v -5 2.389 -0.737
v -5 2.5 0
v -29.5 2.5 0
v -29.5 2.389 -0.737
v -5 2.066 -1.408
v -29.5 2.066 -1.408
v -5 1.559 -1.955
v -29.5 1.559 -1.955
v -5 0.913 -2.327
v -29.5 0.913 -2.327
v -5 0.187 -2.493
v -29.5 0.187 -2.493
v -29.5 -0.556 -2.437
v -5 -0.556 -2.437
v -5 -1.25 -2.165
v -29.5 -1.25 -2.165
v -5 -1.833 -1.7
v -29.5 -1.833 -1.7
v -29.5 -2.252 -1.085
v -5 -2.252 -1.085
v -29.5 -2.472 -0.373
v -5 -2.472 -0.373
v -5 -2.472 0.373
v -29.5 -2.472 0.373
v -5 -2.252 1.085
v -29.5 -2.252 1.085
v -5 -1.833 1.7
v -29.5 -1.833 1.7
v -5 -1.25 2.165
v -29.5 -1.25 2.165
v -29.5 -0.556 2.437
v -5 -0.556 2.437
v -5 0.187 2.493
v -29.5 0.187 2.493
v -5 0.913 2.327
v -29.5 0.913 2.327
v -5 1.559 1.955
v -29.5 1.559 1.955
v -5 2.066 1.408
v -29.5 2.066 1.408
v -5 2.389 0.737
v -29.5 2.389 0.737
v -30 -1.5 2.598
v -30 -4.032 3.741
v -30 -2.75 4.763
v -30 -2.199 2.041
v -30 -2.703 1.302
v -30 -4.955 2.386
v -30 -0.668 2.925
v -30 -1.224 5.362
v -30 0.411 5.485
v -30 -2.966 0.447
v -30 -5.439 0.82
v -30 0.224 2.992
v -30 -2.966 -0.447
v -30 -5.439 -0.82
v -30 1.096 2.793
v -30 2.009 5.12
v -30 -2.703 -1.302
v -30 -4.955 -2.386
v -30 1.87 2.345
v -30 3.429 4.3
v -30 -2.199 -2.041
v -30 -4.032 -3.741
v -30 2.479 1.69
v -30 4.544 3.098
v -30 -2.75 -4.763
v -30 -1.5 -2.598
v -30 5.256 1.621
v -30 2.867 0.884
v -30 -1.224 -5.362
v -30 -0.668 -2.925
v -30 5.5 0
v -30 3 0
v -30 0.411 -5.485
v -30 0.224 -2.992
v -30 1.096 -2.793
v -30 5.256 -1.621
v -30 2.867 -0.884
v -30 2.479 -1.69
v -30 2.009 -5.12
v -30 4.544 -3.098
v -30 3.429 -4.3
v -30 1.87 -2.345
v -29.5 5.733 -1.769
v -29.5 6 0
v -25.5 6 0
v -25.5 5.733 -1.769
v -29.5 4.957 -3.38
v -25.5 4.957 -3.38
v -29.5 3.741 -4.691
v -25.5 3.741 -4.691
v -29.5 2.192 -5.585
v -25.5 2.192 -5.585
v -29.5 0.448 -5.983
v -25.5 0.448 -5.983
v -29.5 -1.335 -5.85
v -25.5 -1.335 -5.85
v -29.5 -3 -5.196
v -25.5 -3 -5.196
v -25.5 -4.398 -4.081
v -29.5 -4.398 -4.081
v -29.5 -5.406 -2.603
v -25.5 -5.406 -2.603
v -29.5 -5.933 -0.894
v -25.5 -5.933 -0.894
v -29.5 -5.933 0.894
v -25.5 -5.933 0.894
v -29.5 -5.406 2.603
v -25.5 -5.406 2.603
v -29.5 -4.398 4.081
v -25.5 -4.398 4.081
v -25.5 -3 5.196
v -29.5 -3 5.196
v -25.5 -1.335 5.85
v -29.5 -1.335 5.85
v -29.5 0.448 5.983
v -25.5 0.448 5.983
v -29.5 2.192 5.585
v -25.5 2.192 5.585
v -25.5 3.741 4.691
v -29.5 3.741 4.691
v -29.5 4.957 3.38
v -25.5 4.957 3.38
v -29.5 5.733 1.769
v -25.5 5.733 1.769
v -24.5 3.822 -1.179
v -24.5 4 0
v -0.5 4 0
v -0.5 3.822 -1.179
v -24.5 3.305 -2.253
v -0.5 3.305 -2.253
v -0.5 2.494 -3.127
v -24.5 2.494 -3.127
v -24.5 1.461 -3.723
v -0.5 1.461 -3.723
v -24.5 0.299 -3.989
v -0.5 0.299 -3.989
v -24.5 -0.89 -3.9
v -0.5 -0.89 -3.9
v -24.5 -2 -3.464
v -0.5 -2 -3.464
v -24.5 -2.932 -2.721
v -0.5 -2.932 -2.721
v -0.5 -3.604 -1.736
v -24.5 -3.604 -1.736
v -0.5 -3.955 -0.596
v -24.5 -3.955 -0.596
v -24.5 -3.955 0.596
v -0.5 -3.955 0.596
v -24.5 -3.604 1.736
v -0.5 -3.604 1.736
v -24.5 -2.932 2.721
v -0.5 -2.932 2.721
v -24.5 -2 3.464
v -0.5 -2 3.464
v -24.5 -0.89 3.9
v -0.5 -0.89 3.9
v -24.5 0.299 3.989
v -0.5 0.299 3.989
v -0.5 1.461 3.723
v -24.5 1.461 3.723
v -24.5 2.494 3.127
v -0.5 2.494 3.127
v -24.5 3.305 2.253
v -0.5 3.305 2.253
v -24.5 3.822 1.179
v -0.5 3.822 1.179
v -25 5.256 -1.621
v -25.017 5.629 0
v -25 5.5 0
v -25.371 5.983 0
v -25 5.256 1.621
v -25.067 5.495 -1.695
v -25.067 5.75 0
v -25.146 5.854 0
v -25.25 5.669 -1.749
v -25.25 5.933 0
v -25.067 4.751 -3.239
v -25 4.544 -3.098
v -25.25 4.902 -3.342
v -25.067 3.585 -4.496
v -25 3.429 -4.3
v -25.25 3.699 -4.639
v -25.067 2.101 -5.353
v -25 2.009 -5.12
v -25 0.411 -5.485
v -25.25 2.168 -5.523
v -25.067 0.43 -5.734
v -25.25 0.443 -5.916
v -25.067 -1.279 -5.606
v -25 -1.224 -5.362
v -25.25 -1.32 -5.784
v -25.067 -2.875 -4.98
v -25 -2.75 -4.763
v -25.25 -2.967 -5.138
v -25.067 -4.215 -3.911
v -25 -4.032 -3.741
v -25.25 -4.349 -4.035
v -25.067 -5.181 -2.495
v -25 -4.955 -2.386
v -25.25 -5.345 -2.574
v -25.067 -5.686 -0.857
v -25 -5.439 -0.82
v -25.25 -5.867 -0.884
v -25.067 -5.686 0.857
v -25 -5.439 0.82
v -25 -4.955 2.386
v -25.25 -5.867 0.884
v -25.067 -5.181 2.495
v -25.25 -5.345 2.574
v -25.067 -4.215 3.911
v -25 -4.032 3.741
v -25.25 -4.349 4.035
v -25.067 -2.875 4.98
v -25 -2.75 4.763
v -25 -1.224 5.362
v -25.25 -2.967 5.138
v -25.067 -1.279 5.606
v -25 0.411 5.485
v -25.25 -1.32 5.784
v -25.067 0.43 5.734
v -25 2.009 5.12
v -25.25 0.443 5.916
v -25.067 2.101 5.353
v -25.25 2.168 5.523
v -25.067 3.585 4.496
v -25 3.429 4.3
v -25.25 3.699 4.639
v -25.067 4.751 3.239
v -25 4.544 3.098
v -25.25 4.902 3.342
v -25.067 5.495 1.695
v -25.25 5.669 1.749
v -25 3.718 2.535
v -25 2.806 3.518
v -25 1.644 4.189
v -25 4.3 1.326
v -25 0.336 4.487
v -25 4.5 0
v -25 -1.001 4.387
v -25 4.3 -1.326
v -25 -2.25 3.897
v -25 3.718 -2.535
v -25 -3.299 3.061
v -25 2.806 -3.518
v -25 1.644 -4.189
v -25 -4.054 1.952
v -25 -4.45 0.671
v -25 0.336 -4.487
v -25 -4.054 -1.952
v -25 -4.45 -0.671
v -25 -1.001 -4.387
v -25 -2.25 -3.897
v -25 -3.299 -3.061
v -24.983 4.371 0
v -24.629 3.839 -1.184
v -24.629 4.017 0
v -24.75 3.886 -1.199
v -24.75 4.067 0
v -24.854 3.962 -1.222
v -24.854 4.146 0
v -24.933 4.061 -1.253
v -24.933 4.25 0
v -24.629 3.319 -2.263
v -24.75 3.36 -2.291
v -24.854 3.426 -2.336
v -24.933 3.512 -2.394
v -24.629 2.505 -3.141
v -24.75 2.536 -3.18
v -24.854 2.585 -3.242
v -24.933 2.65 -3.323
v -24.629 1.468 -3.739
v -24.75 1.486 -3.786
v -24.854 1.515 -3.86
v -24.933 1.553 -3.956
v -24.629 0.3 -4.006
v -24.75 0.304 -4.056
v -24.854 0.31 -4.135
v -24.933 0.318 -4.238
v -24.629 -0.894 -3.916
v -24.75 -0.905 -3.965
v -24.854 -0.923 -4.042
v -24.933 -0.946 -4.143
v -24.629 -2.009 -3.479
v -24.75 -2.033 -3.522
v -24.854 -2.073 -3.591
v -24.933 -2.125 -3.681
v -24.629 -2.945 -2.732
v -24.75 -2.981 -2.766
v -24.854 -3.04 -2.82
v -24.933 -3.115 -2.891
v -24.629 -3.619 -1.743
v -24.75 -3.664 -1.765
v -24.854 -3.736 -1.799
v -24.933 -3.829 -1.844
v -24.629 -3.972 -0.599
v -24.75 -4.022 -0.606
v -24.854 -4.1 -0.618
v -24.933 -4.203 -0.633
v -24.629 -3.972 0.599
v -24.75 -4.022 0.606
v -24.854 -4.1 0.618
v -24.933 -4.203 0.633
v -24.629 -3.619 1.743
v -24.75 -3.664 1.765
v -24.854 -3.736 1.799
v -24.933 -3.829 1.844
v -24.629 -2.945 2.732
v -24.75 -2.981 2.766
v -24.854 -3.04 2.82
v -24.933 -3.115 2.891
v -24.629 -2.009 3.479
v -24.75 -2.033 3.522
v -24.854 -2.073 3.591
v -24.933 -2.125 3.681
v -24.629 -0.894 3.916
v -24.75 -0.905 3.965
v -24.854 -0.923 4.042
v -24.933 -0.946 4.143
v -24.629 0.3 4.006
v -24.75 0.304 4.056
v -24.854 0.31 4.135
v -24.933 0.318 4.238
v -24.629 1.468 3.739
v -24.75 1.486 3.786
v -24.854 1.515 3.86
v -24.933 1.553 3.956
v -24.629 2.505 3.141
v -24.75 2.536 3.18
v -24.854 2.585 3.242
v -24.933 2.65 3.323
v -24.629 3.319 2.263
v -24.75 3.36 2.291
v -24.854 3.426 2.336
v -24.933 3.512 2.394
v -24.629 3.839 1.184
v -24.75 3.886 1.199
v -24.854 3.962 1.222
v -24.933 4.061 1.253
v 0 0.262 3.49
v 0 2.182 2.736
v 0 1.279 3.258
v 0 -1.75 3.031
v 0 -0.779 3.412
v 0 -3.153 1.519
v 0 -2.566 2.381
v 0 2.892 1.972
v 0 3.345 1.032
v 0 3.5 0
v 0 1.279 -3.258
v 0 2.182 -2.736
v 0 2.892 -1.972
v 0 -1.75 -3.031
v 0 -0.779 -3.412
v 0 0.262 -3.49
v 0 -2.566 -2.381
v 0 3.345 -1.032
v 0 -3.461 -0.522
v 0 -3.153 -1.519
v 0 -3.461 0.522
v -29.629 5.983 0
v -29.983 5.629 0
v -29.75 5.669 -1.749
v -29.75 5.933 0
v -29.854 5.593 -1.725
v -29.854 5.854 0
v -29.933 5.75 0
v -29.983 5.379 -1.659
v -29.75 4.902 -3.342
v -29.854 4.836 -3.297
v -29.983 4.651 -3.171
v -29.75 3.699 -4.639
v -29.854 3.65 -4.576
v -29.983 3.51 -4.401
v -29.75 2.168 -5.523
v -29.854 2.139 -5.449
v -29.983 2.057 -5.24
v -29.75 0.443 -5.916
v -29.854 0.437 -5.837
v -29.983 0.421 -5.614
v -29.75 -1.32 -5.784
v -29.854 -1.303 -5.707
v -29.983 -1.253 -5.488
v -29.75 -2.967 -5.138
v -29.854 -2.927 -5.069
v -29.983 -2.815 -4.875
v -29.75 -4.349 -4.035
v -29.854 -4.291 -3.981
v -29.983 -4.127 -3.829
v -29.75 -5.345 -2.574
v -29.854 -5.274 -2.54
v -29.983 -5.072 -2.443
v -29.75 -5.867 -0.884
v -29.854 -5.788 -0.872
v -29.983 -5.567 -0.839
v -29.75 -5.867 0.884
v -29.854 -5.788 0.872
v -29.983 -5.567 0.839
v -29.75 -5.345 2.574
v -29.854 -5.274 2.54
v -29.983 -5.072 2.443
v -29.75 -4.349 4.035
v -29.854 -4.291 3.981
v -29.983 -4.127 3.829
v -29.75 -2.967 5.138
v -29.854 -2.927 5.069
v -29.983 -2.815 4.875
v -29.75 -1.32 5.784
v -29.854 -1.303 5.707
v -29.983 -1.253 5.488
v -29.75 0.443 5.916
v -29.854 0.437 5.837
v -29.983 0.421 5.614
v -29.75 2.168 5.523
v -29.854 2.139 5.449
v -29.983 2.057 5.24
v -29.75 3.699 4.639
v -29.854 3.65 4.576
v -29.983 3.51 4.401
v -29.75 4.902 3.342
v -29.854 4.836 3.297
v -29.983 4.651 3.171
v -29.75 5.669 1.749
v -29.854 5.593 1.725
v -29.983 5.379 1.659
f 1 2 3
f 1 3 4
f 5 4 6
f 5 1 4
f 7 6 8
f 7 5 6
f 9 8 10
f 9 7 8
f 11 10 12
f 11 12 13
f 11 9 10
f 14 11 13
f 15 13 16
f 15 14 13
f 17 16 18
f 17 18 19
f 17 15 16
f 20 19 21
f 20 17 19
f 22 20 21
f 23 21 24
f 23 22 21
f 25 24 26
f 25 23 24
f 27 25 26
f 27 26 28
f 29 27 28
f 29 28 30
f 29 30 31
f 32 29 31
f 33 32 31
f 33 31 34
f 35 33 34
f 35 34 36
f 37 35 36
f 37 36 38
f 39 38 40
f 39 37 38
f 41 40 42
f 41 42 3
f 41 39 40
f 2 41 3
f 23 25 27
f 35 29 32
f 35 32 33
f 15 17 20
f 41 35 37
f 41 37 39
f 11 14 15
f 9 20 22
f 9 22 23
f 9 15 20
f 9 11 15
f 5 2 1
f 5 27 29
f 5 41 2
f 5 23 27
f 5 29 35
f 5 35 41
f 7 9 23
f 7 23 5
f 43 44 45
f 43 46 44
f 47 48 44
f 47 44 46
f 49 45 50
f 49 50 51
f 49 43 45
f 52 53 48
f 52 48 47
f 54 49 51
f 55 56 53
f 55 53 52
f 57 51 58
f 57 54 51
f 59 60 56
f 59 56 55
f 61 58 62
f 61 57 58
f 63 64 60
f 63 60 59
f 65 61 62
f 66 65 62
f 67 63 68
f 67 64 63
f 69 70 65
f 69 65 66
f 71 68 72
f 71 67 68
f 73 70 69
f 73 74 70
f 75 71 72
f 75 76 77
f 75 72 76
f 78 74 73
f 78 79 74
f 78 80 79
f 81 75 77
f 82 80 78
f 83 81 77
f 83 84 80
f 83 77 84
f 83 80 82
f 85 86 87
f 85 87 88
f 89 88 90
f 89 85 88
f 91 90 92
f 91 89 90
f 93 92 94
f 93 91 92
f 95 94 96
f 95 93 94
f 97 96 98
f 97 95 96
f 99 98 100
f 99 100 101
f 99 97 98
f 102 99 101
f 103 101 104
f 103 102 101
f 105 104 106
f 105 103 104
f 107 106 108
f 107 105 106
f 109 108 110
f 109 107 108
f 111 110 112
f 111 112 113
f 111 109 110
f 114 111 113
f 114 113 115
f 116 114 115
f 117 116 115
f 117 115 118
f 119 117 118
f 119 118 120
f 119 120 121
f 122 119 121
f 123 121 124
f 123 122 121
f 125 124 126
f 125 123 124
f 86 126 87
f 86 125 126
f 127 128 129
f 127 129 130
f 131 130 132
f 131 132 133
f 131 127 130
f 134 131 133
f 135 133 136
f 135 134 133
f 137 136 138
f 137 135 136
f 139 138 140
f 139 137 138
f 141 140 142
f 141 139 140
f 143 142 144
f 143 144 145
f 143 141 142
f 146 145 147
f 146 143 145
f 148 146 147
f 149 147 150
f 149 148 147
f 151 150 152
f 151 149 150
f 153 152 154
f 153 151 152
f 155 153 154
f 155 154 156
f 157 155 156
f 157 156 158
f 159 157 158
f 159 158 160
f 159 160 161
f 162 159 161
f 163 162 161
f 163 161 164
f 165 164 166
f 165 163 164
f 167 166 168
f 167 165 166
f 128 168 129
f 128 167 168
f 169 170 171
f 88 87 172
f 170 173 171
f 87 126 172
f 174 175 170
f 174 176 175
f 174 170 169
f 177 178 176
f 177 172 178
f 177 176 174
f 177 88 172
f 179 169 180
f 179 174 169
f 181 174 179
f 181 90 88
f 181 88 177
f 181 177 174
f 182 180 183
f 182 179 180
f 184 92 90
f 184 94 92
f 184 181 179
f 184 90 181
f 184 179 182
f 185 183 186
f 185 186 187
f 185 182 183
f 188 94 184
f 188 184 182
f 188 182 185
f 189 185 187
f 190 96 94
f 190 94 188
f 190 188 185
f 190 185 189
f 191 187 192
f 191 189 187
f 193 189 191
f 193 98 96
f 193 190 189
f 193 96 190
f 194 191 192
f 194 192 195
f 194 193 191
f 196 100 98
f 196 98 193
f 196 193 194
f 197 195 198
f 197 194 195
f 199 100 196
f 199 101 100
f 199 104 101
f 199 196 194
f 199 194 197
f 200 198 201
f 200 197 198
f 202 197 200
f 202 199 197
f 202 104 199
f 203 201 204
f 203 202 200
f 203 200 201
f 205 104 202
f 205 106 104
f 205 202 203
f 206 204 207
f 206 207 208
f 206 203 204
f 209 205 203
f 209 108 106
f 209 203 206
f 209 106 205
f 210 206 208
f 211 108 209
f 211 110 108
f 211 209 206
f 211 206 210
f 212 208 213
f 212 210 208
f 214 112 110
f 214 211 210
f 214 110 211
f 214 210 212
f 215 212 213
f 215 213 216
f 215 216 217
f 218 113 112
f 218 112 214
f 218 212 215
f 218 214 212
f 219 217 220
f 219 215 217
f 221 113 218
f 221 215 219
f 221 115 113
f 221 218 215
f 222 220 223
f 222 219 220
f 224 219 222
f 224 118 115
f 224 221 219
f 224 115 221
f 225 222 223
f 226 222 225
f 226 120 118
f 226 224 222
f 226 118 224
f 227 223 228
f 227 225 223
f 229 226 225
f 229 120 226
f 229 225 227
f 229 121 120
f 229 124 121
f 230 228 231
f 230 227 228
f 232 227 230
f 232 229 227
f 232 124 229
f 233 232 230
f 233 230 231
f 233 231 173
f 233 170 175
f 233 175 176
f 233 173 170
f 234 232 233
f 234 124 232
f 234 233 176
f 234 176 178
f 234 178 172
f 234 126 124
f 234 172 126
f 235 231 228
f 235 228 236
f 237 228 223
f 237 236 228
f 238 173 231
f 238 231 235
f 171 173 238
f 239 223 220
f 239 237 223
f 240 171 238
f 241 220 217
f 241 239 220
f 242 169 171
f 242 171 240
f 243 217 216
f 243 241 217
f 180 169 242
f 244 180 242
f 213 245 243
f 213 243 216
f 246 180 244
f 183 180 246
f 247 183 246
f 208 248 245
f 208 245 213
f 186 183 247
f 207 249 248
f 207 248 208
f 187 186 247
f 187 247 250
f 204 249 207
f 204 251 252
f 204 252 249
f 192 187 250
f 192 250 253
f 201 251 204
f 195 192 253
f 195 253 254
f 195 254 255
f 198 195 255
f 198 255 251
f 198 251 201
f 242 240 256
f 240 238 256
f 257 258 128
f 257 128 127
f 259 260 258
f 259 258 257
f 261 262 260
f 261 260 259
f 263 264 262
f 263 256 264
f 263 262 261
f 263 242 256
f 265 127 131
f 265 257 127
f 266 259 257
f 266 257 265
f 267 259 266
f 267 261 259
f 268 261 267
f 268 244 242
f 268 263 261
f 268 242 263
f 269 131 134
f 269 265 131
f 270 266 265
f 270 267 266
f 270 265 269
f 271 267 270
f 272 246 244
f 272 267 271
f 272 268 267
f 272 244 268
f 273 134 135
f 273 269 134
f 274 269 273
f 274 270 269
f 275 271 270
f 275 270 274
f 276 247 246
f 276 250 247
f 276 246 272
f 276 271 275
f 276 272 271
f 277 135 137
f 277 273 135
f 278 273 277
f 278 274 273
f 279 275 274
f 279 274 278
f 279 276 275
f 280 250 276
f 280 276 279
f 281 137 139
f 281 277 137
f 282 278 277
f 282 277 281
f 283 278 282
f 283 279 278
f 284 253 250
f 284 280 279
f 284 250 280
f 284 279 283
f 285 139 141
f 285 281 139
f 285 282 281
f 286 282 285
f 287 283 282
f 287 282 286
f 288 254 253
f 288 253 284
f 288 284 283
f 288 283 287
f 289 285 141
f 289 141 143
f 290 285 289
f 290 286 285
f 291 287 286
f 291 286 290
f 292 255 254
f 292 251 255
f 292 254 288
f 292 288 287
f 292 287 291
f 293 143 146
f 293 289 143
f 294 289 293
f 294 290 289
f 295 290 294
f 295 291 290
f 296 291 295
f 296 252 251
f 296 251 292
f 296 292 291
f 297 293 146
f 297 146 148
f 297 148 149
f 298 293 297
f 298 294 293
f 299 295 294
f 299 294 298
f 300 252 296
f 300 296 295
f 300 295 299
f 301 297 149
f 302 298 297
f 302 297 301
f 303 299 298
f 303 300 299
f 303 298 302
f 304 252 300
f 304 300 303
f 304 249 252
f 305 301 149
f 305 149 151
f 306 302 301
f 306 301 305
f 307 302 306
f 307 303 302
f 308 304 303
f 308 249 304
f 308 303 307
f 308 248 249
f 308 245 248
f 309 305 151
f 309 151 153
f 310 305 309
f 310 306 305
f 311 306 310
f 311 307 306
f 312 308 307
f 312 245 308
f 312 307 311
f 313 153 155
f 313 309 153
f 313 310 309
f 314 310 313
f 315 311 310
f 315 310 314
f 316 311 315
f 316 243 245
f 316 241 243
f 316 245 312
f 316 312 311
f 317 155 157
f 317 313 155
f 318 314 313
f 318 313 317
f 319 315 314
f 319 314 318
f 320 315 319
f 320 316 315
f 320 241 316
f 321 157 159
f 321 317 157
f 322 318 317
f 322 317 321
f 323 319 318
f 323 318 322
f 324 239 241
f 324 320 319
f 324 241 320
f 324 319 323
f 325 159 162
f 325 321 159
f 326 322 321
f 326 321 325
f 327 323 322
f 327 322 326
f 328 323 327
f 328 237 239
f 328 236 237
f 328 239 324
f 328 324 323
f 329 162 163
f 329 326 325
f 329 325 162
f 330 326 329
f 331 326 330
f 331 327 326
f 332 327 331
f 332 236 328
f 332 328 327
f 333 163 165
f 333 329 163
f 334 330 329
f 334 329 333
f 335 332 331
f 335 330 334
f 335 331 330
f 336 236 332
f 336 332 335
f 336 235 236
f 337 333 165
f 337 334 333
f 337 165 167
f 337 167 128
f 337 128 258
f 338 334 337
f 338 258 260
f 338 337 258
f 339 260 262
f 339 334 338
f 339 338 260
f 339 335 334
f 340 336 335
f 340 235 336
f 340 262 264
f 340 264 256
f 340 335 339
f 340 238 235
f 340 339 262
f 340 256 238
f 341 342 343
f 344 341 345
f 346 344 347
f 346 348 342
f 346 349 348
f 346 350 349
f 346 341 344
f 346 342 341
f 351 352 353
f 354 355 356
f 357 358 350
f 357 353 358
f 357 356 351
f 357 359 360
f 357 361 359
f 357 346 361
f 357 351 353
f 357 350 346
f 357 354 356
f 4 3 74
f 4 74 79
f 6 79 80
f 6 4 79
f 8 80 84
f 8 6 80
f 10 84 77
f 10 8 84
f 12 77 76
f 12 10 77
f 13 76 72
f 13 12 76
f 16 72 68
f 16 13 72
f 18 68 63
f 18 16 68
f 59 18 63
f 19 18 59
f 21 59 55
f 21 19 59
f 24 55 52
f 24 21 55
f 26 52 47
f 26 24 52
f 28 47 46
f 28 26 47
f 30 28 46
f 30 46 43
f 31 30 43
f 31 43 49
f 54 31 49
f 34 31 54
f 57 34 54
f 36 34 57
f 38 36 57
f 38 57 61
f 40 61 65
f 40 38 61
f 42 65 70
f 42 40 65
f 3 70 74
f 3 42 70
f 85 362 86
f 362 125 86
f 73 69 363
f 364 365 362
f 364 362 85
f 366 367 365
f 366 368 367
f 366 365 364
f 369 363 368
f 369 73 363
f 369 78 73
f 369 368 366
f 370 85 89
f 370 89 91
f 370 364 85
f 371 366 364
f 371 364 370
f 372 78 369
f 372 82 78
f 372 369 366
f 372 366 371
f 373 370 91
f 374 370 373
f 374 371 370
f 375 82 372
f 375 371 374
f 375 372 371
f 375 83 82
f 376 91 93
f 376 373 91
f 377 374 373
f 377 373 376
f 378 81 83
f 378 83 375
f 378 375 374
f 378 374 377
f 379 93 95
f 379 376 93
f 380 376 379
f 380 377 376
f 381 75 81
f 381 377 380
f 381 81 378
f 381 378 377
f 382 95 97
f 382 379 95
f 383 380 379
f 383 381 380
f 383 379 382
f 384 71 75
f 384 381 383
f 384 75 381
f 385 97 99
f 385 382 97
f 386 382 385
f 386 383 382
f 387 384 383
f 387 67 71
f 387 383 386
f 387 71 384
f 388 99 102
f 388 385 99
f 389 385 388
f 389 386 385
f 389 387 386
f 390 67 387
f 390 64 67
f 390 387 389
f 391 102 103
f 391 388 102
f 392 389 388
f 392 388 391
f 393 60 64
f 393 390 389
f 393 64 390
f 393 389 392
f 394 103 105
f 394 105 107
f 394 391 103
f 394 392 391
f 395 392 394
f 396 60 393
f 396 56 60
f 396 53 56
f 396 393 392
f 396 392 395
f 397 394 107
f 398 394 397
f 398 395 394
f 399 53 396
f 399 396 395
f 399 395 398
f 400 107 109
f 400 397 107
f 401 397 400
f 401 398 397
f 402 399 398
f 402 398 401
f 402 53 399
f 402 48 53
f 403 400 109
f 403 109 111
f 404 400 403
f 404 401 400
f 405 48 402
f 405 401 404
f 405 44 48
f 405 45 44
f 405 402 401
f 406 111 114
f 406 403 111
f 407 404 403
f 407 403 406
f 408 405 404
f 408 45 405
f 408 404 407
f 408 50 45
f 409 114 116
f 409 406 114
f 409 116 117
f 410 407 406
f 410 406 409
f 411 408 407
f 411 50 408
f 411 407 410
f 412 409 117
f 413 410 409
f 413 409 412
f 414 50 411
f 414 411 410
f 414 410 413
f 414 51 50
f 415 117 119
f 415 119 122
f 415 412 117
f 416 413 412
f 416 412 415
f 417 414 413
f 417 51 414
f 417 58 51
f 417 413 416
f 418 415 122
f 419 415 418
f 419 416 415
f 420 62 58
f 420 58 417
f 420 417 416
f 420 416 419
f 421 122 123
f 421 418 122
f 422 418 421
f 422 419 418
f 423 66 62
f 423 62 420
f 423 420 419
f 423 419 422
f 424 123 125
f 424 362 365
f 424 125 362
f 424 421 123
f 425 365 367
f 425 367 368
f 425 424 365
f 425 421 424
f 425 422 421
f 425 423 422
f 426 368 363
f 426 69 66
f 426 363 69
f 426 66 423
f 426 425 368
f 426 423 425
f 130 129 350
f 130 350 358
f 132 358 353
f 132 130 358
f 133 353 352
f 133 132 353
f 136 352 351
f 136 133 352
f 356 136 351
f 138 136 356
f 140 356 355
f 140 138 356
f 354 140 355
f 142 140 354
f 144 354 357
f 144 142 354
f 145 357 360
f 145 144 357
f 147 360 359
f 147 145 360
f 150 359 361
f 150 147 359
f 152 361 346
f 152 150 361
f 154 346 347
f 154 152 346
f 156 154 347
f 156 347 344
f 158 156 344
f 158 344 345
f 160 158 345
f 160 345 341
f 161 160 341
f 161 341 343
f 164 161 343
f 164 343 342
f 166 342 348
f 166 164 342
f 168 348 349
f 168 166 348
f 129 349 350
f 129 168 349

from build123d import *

# Parameters (mm, degrees)
CHAFL_N1_SIZE = 0.5
REDONDEO1_R   = 0.5


with BuildPart() as part:
    # Croquis1 → Revolución1 (revolve)
    with BuildSketch(Plane.XY):
        Polygon((0, 0), (0, 4), (-25, 4), (-25, 6), (-30, 6), (-30, 2.5), (-5, 2.5), (-5, 0), align=None)
    revolve(axis=Axis((0, 0, 0), (-1, 0, 0)))

    # Chaflán1
    chafl_n1_edges = [part.edges().sort_by_distance(p)[0] for p in [
        (-30, -2.5, 0),
        (0, -4, 0),
    ]]
    chamfer(chafl_n1_edges, length=CHAFL_N1_SIZE)

    # Redondeo1
    redondeo1_edges = [part.edges().sort_by_distance(p)[0] for p in [
        (-30, -6, 0),
        (-25, -6, 0),
        (-25, -4, 0),
    ]]
    fillet(redondeo1_edges, radius=REDONDEO1_R)


solid = part.part
